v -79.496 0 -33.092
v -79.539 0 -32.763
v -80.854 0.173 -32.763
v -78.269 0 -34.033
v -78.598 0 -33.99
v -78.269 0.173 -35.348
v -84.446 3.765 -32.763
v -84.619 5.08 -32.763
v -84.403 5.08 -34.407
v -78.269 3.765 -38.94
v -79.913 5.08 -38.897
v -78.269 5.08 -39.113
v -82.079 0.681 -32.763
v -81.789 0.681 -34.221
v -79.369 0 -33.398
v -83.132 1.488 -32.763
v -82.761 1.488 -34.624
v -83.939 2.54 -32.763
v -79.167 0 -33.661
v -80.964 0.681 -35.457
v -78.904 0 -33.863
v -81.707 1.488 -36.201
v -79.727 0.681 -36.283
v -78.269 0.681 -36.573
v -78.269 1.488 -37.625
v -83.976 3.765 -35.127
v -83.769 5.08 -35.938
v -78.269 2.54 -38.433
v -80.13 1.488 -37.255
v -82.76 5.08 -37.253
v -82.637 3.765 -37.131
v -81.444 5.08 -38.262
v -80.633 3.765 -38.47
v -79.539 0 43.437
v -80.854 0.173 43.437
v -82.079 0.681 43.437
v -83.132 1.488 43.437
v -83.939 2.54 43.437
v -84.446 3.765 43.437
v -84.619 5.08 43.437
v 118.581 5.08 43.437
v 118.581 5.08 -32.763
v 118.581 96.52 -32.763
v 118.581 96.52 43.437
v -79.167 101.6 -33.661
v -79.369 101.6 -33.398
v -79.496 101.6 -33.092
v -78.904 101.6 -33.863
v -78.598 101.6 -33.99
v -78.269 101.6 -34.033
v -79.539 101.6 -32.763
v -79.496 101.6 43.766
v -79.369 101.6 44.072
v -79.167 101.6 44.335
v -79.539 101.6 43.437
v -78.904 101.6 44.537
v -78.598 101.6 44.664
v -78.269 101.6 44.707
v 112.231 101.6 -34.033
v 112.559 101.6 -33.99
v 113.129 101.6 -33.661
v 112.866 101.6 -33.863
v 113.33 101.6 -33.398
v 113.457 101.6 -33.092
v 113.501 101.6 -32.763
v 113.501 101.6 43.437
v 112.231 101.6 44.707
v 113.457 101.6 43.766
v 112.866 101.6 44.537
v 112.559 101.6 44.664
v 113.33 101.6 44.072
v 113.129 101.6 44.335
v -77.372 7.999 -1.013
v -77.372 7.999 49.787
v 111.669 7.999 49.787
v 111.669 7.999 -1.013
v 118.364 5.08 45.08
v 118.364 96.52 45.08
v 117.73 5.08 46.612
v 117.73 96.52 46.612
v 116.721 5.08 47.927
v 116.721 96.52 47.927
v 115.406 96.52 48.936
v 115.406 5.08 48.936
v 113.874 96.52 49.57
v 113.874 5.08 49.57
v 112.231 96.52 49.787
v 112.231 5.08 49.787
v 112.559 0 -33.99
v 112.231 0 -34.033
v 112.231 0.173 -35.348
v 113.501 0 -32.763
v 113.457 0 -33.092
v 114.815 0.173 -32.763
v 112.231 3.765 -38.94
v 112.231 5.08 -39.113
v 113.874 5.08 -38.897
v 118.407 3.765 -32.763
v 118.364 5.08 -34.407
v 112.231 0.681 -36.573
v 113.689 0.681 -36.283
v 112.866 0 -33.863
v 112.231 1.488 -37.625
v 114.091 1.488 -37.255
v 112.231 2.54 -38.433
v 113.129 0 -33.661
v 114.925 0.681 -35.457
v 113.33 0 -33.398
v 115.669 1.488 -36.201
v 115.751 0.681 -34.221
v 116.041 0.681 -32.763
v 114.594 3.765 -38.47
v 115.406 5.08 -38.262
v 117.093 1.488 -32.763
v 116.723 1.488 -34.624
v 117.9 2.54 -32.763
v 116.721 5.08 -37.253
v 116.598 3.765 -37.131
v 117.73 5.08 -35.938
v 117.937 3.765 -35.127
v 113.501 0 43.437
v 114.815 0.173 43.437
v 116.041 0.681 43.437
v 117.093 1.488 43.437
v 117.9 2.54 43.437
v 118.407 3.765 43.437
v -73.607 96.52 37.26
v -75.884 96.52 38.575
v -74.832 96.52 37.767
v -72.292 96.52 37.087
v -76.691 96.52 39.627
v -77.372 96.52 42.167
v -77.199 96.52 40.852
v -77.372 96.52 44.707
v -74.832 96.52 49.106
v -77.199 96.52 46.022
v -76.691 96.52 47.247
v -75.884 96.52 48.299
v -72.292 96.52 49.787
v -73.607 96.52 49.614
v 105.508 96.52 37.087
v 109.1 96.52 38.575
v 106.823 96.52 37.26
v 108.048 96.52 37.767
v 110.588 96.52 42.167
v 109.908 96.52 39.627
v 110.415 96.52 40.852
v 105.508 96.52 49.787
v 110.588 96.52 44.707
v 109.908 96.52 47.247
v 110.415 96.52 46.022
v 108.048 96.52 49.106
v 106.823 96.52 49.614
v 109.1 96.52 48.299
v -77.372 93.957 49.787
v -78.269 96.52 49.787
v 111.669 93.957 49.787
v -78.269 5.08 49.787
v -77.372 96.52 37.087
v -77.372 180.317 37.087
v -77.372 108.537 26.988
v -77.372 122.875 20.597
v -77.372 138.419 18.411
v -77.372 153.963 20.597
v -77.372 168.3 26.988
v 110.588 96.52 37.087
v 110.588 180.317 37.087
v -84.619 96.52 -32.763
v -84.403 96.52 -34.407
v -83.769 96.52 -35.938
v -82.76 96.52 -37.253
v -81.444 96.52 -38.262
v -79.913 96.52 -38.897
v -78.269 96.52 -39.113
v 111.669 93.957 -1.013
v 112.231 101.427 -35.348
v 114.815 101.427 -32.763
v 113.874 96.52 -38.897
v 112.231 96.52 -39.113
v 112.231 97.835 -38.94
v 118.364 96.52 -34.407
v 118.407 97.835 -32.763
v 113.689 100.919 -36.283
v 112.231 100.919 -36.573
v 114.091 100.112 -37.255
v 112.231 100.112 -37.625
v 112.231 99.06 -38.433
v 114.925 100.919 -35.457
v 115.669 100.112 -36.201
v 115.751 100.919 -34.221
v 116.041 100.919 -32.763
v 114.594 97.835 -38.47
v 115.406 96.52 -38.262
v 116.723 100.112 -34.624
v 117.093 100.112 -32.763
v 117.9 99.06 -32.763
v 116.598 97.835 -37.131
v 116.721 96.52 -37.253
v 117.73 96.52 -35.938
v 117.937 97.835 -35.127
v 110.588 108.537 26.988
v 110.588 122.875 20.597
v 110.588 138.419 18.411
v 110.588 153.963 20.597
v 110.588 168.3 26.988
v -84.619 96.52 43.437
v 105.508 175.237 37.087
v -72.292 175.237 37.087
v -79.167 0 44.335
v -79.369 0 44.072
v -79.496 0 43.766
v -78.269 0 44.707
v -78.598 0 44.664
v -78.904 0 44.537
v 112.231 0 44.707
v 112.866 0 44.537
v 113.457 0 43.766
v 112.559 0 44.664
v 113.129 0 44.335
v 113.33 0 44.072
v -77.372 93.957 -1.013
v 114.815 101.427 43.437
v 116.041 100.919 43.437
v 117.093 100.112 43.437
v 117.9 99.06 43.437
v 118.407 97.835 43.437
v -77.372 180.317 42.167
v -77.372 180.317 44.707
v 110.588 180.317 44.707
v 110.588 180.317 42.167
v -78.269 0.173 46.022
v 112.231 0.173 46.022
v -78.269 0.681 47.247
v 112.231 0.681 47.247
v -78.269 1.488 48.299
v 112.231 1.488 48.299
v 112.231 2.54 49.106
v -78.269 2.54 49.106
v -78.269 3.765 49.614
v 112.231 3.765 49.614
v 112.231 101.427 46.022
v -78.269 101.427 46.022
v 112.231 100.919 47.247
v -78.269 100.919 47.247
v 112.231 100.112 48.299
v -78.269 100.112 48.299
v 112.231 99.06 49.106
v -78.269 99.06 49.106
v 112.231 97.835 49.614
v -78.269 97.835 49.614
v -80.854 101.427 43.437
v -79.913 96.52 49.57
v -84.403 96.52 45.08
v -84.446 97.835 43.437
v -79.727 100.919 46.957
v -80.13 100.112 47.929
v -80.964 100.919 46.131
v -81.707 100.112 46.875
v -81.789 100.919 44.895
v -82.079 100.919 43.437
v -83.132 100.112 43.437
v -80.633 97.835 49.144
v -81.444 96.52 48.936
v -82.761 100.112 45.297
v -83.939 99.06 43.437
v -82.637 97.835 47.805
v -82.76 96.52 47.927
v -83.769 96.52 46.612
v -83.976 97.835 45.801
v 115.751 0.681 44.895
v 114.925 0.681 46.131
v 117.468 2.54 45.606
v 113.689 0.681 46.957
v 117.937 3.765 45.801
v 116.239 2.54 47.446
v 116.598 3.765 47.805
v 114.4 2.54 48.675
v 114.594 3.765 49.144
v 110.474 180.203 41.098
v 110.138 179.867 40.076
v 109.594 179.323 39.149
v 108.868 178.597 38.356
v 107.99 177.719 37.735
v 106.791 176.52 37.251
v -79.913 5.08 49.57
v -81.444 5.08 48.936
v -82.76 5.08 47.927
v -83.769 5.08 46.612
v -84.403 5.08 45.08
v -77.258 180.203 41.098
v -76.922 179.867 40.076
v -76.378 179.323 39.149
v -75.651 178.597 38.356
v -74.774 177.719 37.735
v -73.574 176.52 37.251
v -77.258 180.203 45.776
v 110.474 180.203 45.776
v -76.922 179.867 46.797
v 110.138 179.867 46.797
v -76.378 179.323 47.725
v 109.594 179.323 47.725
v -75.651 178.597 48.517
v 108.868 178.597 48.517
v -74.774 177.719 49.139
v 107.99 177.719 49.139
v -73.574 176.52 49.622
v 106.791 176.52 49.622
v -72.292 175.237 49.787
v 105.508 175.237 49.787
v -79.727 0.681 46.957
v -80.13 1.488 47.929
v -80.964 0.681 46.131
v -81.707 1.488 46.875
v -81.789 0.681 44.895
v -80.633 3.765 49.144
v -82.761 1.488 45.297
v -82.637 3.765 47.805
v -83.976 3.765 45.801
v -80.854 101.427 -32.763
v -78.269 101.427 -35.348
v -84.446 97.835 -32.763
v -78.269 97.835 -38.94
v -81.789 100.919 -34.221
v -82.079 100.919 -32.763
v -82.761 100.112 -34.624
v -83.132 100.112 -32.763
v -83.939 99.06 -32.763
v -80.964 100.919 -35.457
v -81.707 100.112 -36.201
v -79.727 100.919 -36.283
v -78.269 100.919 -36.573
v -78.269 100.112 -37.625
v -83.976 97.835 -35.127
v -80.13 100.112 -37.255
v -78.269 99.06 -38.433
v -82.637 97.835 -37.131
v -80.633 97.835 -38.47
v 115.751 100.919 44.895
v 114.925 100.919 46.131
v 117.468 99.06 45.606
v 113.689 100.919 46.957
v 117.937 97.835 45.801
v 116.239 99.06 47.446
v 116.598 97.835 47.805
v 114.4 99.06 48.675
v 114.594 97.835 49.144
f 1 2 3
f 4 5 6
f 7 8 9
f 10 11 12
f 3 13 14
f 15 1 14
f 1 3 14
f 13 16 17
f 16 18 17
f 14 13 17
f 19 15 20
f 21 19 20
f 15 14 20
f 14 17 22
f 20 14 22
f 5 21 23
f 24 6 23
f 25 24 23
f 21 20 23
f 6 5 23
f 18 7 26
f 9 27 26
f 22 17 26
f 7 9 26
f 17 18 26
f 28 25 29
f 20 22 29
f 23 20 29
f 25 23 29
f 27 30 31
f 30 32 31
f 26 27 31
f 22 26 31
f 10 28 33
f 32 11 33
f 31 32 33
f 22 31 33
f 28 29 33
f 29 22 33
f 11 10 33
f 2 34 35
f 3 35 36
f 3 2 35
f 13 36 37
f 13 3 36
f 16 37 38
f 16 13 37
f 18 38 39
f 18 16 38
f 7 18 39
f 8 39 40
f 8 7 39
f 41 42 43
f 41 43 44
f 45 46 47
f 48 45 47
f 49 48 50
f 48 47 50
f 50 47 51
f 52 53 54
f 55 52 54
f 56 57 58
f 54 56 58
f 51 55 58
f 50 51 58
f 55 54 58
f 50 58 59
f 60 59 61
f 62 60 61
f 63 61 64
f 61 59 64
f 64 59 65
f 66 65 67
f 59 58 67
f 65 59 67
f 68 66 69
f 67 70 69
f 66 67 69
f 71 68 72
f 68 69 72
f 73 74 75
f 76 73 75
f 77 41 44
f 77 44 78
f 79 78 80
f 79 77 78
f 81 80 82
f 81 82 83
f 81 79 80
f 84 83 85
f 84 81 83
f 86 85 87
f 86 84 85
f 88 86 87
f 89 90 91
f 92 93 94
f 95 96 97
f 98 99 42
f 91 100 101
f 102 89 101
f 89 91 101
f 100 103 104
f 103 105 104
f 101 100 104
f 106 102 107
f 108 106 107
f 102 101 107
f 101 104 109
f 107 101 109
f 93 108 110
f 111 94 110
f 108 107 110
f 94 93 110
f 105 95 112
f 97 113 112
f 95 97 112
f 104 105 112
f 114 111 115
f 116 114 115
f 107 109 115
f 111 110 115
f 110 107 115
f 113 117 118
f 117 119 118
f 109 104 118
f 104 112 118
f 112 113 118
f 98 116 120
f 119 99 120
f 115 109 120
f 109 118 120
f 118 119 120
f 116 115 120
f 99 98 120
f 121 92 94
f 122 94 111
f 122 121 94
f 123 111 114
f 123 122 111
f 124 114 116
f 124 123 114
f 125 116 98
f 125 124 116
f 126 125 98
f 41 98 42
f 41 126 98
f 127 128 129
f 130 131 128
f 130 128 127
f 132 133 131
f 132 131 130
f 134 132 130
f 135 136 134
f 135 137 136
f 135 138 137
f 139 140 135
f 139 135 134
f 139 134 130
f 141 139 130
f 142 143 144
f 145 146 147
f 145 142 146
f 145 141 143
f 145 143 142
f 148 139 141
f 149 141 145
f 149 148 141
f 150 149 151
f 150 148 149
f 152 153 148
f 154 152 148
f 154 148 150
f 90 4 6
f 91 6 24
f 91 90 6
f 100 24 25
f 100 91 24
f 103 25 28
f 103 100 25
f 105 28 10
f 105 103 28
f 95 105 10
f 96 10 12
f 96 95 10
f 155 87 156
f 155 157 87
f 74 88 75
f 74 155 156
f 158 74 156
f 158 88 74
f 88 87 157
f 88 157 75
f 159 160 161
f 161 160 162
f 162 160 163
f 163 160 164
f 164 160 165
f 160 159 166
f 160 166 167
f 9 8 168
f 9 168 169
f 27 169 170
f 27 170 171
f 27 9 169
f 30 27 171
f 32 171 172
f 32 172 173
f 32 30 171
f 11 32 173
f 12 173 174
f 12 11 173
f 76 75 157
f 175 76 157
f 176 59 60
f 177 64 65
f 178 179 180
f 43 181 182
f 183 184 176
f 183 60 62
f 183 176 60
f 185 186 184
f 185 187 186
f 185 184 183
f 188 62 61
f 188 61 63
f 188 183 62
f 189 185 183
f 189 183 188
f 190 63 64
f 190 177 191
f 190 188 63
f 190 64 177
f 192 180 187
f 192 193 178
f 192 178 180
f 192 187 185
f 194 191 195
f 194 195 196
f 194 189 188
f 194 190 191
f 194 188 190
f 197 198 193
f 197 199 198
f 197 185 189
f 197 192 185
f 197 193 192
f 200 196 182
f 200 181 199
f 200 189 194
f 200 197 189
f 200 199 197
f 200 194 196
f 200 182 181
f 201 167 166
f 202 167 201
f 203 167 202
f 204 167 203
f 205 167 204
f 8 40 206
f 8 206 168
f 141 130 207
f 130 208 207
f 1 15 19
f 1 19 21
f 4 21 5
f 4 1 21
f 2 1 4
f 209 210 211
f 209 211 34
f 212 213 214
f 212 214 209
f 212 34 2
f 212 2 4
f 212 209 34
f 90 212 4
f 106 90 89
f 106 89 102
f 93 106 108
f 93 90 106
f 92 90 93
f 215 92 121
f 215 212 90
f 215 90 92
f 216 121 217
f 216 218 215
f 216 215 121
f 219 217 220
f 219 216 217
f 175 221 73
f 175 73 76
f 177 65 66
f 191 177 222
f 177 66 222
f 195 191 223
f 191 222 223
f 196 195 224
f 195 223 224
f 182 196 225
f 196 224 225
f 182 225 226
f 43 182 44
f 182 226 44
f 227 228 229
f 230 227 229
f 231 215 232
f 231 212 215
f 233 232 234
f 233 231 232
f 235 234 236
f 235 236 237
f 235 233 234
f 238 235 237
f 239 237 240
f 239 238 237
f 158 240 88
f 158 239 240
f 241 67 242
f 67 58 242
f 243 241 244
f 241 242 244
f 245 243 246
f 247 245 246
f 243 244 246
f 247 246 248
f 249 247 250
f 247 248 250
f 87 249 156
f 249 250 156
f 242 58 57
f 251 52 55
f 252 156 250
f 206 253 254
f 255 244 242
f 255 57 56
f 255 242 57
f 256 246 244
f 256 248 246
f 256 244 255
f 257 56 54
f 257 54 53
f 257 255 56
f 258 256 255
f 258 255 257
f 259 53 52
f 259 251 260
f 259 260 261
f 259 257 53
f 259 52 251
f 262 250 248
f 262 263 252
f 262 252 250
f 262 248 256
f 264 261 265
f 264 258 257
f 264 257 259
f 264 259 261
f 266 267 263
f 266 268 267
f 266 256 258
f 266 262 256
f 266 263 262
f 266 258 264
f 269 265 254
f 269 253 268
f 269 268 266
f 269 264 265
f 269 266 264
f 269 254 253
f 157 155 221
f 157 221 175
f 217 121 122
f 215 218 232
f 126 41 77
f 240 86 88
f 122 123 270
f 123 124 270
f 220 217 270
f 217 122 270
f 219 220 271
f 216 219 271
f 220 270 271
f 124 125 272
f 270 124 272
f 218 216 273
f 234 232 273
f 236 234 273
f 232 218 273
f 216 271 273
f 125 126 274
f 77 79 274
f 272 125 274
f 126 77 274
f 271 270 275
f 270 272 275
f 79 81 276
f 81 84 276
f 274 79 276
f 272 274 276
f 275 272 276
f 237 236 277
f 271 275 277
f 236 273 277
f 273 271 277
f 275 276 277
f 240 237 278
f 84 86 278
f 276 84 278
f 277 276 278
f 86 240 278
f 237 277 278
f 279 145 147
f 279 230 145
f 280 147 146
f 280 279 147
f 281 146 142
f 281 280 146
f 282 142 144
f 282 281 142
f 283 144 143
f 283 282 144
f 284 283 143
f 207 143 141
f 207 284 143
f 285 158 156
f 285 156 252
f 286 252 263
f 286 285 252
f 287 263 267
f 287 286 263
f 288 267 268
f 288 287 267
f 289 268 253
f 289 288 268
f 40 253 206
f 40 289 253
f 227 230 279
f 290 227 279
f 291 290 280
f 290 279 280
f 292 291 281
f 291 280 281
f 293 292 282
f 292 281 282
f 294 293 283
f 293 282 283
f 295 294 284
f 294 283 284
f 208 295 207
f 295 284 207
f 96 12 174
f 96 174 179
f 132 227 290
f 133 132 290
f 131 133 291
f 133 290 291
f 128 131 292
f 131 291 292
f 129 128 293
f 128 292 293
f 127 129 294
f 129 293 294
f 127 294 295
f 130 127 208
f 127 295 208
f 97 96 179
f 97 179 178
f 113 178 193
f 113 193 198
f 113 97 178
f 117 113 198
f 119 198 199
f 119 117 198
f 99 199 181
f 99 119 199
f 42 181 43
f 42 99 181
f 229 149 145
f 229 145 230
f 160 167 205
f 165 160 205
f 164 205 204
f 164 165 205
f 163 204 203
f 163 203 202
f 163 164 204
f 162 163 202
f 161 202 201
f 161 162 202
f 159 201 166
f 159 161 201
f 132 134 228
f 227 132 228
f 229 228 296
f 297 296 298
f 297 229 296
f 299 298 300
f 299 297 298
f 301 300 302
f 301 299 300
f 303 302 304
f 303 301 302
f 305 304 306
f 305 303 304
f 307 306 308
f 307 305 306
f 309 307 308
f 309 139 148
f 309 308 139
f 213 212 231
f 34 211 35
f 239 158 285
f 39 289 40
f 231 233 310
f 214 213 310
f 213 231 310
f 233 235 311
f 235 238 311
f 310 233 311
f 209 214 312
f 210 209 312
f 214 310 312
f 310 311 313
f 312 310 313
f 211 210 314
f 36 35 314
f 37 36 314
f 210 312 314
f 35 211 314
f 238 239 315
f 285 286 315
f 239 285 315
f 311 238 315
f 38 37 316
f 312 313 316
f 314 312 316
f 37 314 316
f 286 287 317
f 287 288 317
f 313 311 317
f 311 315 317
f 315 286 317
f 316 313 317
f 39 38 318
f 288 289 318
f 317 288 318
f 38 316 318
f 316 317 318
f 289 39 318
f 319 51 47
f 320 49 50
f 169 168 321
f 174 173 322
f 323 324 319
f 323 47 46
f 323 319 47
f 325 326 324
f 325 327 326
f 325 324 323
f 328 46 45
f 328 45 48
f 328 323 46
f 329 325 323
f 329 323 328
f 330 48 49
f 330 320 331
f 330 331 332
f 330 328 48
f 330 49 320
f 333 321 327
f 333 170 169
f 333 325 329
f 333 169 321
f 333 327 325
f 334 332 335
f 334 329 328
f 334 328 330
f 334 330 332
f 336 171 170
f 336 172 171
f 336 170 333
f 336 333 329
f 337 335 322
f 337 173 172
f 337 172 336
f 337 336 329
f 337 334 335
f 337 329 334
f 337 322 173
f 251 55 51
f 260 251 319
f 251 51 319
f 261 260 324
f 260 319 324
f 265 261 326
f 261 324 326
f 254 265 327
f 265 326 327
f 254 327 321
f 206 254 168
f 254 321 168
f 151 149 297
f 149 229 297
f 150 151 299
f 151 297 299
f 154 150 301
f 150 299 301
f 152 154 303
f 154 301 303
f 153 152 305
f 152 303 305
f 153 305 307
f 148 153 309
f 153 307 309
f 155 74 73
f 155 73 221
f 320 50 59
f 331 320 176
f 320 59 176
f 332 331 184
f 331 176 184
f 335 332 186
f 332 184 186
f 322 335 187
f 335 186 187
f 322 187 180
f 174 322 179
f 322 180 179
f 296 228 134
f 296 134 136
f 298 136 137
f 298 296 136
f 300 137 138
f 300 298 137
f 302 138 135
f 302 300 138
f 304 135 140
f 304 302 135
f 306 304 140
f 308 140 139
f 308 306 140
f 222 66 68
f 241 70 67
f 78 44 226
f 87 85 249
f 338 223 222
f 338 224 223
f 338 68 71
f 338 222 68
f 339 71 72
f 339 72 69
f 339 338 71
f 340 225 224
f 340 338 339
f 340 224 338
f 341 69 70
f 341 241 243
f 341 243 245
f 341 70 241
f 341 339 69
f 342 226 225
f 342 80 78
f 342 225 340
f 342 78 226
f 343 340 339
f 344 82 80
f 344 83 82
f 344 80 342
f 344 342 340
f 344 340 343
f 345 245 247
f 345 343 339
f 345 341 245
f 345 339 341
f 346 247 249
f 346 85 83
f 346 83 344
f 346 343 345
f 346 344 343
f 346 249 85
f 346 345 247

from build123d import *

# Parameters (mm, degrees)
F1_DEPTH = 101.6
F2_W     = 189.0404075384
F2_H     = 85.95798444
F3_DEPTH = 50.8
F4_R     = 5.08
F5_W     = 187.96
F5_H     = 83.7971559429
F6_DEPTH = 12.7
F8_DEPTH = 187.96
F9_R     = 5.08


with BuildPart() as f1:
    # F0 (on Front) → F1 (new body)
    with BuildSketch(Plane.XZ):
        with BuildLine():
            ThreePointArc((-84.6194562674, -32.7631937014), (-82.7595843279, -37.2533217619), (-78.2694562674, -39.1131937014))
            Line((-78.2694562674, -39.1131937014), (112.2305437326, -39.1131937014))
            ThreePointArc((112.2305437326, -39.1131937014), (116.7206717932, -37.2533217619), (118.5805437326, -32.7631937014))
            Line((118.5805437326, -32.7631937014), (118.5805437326, 43.4368062986))
            ThreePointArc((118.5805437326, 43.4368062986), (116.7206717932, 47.9269343592), (112.2305437326, 49.7868062986))
            Line((112.2305437326, 49.7868062986), (-78.2694562674, 49.7868062986))
            ThreePointArc((-78.2694562674, 49.7868062986), (-82.7595843279, 47.9269343592), (-84.6194562674, 43.4368062986))
            Line((-84.6194562674, 43.4368062986), (-84.6194562674, -32.7631937014))
        make_face()
    extrude(amount=-F1_DEPTH)

    # F2 (on face) → F3 (cut)
    with BuildSketch(Plane.XY.offset(49.7868062986)):
        with Locations((17.1484276652, 50.9781637229)):
            Rectangle(F2_W, F2_H)
    extrude(amount=-F3_DEPTH, mode=Mode.SUBTRACT)

    # F4
    f4_edges = [f1.edges().sort_by_distance(p)[0] for p in [
        (16.980544, 101.6, 49.786806),
        (16.980544, 0, 49.786806),
    ]]
    fillet(f4_edges, radius=F4_R)


with BuildPart() as f6:
    # F5 (on face) → F6 (new body)
    with BuildSketch(Plane.XY.offset(49.7868062986)):
        with Locations((16.608223896, 138.4185779715)):
            Rectangle(F5_W, F5_H)
    extrude(amount=-F6_DEPTH)

    # F9
    f9_edges = [f6.edges().sort_by_distance(p)[0] for p in [
        (-77.371776, 138.418578, 49.786806),
        (16.608224, 180.317156, 49.786806),
        (110.588224, 138.418578, 49.786806),
        (16.608224, 180.317156, 37.086806),
        (110.588224, 138.418578, 37.086806),
        (-77.371776, 138.418578, 37.086806),
    ]]
    fillet(f9_edges, radius=F9_R)


with BuildPart() as f8:
    # F7 (on face) → F8 (new body)
    with BuildSketch(Plane(origin=(-77.371776104, 0, 0), x_dir=(0, -1, 0), z_dir=(-1, 0, 0))):
        with BuildLine():
            Line((-96.52, 37.0868062986), (-180.3171559429, 37.0868062986))
            ThreePointArc((-180.3171559429, 37.0868062986), (-138.4185779715, 18.4105001305), (-96.52, 37.0868062986))
        make_face()
    extrude(amount=-F8_DEPTH)


solid = Compound([f1.part, f6.part, f8.part])
